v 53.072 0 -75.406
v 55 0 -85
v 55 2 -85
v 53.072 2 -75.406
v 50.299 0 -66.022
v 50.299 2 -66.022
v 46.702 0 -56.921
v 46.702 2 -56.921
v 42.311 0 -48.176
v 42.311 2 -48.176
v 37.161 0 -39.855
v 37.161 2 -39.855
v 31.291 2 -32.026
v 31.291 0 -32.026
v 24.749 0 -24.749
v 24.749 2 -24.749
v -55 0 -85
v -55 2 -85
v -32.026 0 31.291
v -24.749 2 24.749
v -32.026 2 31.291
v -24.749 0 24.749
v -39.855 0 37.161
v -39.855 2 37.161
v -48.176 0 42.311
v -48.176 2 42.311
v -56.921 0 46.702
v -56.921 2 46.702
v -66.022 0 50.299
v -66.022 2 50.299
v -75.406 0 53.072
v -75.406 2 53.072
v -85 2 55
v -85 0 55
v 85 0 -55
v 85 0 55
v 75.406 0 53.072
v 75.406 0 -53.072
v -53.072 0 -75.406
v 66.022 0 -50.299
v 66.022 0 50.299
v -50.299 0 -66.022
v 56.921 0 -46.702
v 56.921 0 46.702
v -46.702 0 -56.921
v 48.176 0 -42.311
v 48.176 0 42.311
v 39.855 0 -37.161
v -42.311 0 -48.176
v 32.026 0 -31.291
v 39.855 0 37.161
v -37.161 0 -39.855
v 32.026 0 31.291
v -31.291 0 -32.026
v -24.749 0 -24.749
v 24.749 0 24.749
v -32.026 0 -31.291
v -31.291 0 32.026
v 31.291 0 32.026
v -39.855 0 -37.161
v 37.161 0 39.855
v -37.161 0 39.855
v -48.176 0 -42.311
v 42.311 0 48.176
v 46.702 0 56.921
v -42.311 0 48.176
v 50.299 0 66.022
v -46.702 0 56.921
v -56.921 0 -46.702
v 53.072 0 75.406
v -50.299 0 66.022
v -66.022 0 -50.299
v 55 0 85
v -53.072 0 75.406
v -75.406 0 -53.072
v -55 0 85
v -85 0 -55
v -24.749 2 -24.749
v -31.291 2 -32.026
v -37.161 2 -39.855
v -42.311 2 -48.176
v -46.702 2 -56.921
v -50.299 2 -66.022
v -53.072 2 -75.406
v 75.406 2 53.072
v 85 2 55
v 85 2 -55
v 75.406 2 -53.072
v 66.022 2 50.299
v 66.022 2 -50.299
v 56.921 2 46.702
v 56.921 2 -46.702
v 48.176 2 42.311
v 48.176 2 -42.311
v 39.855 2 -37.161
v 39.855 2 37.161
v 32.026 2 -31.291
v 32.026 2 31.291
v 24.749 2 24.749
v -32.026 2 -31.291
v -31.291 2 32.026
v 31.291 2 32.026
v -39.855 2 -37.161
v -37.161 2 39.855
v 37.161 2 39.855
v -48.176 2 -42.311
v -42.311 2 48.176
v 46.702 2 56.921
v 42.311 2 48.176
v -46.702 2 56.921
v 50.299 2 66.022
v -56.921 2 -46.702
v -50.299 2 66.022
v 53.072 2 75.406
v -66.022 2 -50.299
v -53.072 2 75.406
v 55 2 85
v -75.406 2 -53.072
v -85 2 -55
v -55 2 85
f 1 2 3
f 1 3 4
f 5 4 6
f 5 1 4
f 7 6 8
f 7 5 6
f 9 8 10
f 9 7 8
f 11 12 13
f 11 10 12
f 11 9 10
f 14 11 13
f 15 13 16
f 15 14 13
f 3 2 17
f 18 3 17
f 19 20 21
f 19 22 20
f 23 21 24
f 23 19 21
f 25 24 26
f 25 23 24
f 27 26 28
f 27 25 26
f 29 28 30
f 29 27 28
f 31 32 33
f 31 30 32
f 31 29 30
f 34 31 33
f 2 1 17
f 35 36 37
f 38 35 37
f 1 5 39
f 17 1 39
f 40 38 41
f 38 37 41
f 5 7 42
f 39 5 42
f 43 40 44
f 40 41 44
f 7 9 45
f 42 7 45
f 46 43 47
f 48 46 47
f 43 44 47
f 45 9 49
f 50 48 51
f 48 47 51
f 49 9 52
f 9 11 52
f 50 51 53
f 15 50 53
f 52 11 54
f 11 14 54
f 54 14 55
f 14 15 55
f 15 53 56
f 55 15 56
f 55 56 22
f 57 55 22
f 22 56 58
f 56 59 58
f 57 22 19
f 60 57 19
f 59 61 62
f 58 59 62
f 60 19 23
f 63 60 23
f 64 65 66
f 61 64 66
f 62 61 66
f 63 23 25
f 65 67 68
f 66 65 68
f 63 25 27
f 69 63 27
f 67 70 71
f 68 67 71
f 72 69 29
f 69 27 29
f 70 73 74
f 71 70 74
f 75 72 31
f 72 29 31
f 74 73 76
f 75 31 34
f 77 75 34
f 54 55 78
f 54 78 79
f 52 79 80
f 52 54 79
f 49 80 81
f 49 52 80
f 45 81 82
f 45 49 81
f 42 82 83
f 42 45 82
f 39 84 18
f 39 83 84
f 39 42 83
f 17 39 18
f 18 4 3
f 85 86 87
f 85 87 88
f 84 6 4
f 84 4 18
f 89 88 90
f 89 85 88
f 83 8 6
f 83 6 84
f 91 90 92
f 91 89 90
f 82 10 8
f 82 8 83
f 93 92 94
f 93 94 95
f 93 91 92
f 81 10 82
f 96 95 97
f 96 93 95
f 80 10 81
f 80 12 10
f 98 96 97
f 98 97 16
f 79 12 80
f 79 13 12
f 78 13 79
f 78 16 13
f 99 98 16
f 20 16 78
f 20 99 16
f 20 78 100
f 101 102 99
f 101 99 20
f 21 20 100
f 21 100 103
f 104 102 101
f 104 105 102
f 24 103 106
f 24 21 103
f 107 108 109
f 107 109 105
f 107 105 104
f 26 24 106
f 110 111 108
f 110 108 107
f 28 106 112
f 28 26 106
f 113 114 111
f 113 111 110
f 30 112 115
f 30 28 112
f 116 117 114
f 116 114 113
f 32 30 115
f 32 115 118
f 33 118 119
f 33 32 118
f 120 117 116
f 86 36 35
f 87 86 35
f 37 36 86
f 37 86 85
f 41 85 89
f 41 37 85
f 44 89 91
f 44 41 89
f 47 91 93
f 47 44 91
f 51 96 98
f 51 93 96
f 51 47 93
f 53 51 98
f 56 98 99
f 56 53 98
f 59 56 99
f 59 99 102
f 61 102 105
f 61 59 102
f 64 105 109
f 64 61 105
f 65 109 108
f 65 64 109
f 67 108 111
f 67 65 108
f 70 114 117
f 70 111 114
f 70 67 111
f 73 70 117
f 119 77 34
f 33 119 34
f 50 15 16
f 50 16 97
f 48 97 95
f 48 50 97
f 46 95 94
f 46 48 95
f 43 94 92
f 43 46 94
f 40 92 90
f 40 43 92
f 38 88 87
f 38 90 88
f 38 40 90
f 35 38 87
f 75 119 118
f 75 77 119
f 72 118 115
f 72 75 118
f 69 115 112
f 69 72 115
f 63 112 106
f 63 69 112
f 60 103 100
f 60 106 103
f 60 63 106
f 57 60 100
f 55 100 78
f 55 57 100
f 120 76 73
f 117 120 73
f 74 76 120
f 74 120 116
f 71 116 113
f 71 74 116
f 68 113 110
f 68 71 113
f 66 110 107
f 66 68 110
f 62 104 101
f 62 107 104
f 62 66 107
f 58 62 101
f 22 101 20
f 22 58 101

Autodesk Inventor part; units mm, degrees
ref_plane "YZ Plane" through (0, 0, 0) normal (1, 0, 0) x (0, 1, 0)
ref_plane "XZ Plane" through (0, 0, 0) normal (0, 1, 0) x (-1, 0, 0)
ref_plane "XY Plane" through (0, 0, 0) normal (0, 0, 1) x (1, 0, 0)
sketch "Boceto1" plane through (0, 0, 0) normal (0, 1, 0) x (-1, 0, 0)
  circle A0 centre (0, 0) radius 35
  line L0 (-85, 55) -> (-85, -55)
  line L1 (-55, -85) -> (55, -85)
  line L2 (85, -55) -> (85, 55)
  line L3 (55, 85) -> (-55, 85)
  arc A1 (24.7487, 24.7487) -> (55, 85) centre (-53.7007, 101.857) ccw
  arc A2 (85, 55) -> (24.7487, 24.7487) centre (101.857, -53.7007) ccw
  arc A3 (24.7487, -24.7487) -> (85, -55) centre (101.857, 53.7007) ccw
  arc A4 (55, -85) -> (24.7487, -24.7487) centre (-53.7007, -101.857) ccw
  arc A5 (-24.7487, -24.7487) -> (-55, -85) centre (53.7007, -101.857) ccw
  arc A6 (-85, -55) -> (-24.7487, -24.7487) centre (-101.857, 53.7007) ccw
  arc A7 (-24.7487, 24.7487) -> (-85, 55) centre (-101.857, -53.7007) ccw
  arc A8 (-55, 85) -> (-24.7487, 24.7487) centre (53.7007, 101.857) ccw
  dimension "d3" = 70
extrude "Extrusión1" add sketch "Boceto1" along normal blind 2
properties part number "IMPRESION SIN PINES" material "Plástico PET"
